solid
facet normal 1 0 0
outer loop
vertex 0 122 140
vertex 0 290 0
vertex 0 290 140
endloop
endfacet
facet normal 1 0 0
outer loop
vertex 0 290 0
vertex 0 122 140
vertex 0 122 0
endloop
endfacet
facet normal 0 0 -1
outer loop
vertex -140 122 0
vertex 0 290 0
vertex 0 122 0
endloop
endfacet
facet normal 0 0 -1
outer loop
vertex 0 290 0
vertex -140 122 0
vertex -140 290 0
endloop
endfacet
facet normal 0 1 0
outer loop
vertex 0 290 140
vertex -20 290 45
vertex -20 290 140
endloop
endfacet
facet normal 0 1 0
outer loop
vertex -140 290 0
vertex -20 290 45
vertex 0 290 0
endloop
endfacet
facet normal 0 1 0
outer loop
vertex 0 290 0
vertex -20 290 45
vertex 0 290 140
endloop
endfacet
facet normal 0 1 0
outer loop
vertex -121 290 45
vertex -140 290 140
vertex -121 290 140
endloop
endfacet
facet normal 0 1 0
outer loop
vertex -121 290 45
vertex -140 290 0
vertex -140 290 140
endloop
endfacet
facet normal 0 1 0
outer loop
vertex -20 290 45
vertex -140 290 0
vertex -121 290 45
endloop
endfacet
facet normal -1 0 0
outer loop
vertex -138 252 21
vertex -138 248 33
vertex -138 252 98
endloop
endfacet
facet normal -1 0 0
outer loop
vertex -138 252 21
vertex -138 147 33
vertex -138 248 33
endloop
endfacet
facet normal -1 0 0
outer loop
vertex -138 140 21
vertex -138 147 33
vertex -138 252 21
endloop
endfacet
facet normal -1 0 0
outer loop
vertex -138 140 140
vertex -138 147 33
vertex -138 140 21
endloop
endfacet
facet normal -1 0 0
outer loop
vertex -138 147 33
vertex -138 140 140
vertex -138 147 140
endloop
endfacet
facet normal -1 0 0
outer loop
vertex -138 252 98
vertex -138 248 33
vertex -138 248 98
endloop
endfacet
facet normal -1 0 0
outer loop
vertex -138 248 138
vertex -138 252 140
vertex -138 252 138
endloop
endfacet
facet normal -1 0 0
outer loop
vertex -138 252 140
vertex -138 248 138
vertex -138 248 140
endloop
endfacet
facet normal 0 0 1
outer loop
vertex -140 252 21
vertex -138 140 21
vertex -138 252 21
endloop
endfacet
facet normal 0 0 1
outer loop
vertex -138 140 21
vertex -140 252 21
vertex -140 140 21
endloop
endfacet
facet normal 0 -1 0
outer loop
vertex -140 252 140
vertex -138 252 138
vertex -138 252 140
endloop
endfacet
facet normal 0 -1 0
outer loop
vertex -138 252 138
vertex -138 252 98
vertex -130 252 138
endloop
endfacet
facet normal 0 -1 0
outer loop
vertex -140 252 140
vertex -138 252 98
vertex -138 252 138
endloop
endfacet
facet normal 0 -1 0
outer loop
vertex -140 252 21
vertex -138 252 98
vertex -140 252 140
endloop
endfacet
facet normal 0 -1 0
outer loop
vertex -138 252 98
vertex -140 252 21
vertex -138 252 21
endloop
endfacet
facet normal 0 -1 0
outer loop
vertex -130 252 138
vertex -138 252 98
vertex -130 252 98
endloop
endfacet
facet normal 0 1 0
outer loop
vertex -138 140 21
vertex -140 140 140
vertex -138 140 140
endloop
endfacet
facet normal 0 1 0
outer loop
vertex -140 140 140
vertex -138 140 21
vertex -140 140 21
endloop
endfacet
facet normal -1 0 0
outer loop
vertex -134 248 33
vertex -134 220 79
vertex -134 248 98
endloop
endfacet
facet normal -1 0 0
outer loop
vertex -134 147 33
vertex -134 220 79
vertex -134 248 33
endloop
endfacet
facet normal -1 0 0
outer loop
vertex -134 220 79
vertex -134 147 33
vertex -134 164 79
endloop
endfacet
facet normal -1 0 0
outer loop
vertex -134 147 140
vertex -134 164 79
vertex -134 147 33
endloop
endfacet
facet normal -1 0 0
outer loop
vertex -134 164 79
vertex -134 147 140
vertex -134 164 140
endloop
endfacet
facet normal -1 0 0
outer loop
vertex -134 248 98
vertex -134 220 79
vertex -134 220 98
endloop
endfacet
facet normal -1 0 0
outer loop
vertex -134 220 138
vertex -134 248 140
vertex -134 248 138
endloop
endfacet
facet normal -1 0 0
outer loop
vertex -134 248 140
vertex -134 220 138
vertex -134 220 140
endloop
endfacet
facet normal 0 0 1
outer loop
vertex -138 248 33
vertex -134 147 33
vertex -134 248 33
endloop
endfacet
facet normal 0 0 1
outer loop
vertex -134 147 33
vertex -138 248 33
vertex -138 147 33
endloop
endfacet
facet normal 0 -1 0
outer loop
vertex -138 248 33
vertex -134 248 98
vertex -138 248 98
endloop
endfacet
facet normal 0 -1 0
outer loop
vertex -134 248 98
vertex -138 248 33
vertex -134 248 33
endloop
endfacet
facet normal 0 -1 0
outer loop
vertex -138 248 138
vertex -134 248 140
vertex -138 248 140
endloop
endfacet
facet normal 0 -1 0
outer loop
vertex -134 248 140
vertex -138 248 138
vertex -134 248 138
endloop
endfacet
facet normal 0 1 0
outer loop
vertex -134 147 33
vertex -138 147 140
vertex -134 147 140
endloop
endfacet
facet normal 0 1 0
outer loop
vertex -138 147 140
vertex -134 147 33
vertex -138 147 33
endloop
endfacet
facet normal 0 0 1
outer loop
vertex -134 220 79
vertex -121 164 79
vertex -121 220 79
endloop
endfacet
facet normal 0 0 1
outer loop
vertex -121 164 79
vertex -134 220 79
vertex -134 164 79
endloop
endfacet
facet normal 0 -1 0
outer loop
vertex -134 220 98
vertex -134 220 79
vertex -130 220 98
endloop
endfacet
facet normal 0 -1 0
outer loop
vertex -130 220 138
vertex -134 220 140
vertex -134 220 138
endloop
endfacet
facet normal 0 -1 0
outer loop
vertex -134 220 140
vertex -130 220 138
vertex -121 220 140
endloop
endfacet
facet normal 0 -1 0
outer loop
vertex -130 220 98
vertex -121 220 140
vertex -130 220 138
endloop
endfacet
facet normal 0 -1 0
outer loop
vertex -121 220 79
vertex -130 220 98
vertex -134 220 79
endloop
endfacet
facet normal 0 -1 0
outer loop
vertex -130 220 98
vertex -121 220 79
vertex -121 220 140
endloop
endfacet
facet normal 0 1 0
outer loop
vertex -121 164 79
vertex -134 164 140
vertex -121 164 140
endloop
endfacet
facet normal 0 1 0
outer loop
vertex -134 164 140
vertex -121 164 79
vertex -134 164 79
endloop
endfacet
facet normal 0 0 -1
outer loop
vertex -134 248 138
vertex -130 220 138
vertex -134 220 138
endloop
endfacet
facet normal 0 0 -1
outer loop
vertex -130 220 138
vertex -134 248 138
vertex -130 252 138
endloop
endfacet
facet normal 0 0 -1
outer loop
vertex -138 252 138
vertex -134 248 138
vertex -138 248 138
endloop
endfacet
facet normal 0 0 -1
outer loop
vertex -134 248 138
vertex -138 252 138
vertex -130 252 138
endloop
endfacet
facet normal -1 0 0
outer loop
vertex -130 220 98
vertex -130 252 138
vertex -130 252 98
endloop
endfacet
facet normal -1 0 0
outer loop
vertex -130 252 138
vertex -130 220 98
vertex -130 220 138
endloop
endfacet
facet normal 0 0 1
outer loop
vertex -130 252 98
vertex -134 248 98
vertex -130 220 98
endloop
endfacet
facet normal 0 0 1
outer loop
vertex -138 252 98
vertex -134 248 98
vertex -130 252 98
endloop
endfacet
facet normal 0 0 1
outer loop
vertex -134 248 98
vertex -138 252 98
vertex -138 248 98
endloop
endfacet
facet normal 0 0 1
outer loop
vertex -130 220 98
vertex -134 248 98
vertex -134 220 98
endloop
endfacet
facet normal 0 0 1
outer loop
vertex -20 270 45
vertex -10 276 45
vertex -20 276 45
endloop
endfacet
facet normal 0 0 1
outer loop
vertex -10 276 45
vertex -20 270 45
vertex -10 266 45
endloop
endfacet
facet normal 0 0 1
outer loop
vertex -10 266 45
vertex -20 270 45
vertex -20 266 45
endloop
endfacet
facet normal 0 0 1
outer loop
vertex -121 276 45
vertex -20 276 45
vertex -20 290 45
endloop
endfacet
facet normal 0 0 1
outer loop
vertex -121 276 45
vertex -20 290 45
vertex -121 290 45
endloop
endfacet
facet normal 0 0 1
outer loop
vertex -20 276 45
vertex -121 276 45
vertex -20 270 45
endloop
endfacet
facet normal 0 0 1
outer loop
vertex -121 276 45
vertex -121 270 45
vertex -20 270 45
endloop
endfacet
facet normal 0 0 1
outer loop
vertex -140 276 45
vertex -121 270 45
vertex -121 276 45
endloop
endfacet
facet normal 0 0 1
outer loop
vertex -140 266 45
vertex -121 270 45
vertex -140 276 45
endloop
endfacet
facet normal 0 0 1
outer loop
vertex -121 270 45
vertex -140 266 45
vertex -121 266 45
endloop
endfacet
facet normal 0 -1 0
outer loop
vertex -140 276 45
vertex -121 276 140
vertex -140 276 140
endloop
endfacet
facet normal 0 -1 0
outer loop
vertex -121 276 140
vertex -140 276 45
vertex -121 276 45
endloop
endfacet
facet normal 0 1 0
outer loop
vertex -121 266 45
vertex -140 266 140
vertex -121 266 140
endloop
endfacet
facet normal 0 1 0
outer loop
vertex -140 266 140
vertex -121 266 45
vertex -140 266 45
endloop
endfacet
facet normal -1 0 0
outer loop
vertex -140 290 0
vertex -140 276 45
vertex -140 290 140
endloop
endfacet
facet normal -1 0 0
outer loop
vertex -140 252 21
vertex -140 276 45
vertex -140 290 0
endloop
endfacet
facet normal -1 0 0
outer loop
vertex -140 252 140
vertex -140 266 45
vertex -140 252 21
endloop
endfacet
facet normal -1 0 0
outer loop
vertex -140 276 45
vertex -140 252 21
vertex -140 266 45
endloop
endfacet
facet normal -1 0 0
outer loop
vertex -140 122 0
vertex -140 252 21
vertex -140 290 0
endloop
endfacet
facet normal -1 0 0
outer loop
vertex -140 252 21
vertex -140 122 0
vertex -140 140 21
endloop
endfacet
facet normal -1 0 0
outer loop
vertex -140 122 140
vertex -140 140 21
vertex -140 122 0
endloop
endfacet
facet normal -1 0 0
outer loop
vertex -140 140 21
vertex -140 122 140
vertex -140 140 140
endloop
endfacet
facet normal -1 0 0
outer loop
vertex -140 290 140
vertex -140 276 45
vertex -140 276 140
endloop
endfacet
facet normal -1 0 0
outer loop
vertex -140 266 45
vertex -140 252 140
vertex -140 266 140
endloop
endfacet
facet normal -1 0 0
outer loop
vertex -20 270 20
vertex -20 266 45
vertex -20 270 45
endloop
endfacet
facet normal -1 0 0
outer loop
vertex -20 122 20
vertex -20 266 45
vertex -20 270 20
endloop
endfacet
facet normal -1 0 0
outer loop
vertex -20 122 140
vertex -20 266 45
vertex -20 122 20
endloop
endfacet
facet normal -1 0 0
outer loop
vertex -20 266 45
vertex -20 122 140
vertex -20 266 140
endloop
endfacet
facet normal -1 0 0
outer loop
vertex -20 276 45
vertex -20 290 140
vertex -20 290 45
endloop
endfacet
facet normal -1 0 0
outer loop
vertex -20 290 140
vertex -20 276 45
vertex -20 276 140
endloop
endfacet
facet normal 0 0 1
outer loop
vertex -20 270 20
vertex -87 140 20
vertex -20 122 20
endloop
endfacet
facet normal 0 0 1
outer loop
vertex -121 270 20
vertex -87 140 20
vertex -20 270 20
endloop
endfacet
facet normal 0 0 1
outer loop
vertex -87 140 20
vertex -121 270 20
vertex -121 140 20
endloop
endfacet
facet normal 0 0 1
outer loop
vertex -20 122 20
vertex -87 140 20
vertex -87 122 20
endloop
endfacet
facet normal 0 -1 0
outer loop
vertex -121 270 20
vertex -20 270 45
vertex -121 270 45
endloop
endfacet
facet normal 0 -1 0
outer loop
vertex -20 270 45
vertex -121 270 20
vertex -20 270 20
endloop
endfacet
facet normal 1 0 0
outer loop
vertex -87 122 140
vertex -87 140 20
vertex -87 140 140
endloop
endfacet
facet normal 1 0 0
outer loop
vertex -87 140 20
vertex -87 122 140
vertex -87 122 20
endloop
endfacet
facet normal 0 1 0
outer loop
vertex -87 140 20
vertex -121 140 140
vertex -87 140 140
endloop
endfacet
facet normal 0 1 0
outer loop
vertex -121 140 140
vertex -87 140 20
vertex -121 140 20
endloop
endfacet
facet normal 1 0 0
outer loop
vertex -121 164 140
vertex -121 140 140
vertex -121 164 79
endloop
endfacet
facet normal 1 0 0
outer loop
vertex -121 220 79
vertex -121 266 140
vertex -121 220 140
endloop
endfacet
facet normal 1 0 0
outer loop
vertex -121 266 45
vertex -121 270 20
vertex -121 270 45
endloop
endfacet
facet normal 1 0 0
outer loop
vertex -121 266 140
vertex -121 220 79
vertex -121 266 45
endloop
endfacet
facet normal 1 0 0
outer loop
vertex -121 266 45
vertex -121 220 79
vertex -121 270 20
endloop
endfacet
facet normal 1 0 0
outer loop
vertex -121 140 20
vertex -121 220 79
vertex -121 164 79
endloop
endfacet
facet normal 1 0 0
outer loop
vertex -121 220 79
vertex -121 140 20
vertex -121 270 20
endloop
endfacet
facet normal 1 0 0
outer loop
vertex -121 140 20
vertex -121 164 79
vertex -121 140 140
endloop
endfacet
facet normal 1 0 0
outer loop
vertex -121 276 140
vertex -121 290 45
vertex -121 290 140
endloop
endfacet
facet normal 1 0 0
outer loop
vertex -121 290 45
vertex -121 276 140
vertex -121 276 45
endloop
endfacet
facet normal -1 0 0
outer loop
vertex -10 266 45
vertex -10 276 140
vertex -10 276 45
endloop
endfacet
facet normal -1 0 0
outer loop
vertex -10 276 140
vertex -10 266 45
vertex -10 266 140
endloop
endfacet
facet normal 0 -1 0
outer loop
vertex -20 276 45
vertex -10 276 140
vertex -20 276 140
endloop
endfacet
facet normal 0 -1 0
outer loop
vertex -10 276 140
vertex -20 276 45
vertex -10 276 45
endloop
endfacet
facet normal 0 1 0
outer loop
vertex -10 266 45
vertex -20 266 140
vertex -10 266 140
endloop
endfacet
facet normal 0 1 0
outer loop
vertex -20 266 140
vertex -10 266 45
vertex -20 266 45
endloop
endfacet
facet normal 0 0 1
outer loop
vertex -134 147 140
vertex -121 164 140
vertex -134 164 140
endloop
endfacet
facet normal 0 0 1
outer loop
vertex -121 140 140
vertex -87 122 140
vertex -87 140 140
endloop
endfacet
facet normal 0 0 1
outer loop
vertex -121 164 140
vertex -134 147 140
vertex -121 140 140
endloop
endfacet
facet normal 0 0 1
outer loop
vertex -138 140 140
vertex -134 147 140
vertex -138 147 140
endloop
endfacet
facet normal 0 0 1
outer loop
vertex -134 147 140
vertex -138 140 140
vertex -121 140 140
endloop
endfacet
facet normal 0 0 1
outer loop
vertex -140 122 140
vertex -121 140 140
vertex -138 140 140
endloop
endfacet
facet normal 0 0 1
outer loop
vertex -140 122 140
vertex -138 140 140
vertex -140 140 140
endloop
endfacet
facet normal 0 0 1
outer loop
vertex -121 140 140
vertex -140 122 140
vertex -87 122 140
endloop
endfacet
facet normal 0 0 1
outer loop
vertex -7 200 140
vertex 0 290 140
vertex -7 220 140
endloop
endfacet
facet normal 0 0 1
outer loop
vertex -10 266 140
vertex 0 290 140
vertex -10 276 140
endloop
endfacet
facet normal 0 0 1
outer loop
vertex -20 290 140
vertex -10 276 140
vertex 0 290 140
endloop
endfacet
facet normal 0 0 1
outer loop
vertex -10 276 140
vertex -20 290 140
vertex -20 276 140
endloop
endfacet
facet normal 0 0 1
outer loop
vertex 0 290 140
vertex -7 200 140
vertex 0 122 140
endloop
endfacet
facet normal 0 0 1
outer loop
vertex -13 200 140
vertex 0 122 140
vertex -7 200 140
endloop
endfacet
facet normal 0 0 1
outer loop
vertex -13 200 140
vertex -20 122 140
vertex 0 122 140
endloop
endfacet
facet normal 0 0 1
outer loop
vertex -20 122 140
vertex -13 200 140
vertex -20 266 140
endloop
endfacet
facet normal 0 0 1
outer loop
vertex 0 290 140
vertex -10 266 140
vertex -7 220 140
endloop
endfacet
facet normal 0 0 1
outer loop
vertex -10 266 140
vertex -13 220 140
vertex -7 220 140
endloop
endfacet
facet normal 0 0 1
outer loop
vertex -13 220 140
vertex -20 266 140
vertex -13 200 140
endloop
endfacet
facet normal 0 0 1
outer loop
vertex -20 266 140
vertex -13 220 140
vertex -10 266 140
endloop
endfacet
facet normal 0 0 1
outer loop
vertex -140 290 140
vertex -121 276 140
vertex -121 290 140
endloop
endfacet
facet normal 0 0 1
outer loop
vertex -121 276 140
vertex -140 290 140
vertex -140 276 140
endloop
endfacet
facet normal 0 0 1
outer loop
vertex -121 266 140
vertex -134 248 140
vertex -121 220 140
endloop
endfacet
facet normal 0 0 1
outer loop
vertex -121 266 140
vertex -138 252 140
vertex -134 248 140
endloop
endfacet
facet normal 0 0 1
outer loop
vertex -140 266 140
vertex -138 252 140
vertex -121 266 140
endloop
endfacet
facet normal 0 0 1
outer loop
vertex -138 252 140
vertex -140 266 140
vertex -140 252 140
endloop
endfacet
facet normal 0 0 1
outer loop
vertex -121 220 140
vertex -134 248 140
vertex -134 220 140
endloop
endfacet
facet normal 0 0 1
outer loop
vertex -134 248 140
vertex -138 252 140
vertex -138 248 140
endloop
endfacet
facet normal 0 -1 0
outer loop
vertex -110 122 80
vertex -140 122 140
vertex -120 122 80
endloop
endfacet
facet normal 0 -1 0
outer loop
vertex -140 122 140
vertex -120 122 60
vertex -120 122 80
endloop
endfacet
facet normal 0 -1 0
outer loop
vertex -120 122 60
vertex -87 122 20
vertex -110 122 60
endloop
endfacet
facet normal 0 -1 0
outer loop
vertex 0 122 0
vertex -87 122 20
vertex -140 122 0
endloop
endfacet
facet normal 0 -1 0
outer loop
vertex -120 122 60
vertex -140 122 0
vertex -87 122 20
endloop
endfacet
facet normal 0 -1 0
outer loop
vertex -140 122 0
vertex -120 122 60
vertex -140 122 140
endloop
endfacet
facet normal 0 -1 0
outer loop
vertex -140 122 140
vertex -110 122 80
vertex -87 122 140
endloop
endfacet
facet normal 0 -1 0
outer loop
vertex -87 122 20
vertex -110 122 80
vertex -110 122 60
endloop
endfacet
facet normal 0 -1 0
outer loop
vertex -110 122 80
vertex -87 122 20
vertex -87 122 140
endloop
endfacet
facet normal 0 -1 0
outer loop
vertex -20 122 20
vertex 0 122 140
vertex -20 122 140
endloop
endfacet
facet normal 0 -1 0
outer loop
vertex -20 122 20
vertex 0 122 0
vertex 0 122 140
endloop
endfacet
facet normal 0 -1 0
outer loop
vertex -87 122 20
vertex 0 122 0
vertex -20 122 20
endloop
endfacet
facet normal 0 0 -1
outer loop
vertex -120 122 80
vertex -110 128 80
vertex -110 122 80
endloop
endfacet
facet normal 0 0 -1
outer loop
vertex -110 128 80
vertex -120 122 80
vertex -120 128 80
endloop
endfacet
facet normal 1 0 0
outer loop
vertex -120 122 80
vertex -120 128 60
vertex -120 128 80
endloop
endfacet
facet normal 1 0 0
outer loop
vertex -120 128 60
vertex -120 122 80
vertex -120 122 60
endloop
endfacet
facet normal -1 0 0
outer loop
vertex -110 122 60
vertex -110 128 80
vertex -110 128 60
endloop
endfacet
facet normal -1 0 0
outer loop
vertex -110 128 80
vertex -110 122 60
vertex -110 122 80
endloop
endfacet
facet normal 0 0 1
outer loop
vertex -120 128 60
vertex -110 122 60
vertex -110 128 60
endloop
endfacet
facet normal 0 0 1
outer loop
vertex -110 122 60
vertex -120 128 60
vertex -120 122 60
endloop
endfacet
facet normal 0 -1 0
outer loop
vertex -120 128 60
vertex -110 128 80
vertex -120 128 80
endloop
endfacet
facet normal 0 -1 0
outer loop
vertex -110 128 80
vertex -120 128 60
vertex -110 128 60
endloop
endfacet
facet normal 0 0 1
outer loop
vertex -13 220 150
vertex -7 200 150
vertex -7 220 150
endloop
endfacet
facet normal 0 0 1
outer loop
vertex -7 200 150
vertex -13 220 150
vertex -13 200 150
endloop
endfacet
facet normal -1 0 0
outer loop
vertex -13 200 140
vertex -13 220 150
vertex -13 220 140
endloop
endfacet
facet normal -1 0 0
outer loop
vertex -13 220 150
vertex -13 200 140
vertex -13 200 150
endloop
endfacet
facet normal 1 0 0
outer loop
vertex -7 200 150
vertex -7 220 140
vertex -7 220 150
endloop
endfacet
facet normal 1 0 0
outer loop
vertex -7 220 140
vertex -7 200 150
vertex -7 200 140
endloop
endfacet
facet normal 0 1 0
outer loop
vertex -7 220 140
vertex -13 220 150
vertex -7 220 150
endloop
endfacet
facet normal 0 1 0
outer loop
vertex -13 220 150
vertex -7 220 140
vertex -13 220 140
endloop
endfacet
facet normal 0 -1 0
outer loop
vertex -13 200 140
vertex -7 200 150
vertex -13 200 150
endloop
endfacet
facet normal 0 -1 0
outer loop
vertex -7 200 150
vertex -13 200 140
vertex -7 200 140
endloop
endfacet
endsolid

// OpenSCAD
rotate(a=90,v=[0,-1,0]) {
difference() {
    union() {
        difference() {
            cube([235,290,80]); // bottom
            
            union() {
                translate([168,20,78])
                cube([53,74,3]);    // nfc
                translate([180,94,78])
                cube([29,35,3]);    // nfc module
                translate([187,122,78])
                cube([14,20,3]);    // nfc line
                
                translate([50,-1,30])
                cube([57,11,5]);    // printer
            }
        }
        
        translate([0,60,80])
        rotate(a=90,v=[0,1,0]) {
            cylinder(r=60,h=140,$fn=50);    // front
        }
        
        difference() {
            translate([0,60,80])
            cube([140,65,60]);  // front2
        }
        
        difference() {
            translate([0,122,80])
            cube([235,168,60]); // back
            
            union() {
                translate([187,122,79])
                cube([14,20,6]);    // nfc line
                
                translate([21,140,138])
                cube([193,112,3]);  // lcd
                translate([33,147,134])
                cube([167,101,5]);  // lcd bottom
                translate([79,164,120])
                cube([65,56,15]);   // lcd module
                translate([98,220,130])
                cube([40,32,10]);    // lcd line
                
                translate([45,266,120])
                cube([145,10,21]);  // back lid
            }
        }
    }
    
    union() {
        translate([20,10,20])
        cube([195,260,40]); // inside bottom
        
        translate([20,10,60])
        cube([113,130,27]); // inside printer
        translate([20,140,60])
        cube([195,130,61]); // inside lcd
        
        translate([45,266,20])
        cube([145,25,101]); // inside back lid
        translate([45,266,10])
        cube([145,10,11]);  // inside bottom lid
        
        translate([140,-1,-1])
        cube([96,292,142]);
        translate([-1,-1,-1])
        cube([141,123,142]);
        
        translate([132,121,60])
        cube([9,20,27]);   // 133+7,122+18,60+27
        
        translate([60,121,110])
        cube([20,7,10]);
    }
}

translate([139,200,7])
cube([11,20,6]);

}
